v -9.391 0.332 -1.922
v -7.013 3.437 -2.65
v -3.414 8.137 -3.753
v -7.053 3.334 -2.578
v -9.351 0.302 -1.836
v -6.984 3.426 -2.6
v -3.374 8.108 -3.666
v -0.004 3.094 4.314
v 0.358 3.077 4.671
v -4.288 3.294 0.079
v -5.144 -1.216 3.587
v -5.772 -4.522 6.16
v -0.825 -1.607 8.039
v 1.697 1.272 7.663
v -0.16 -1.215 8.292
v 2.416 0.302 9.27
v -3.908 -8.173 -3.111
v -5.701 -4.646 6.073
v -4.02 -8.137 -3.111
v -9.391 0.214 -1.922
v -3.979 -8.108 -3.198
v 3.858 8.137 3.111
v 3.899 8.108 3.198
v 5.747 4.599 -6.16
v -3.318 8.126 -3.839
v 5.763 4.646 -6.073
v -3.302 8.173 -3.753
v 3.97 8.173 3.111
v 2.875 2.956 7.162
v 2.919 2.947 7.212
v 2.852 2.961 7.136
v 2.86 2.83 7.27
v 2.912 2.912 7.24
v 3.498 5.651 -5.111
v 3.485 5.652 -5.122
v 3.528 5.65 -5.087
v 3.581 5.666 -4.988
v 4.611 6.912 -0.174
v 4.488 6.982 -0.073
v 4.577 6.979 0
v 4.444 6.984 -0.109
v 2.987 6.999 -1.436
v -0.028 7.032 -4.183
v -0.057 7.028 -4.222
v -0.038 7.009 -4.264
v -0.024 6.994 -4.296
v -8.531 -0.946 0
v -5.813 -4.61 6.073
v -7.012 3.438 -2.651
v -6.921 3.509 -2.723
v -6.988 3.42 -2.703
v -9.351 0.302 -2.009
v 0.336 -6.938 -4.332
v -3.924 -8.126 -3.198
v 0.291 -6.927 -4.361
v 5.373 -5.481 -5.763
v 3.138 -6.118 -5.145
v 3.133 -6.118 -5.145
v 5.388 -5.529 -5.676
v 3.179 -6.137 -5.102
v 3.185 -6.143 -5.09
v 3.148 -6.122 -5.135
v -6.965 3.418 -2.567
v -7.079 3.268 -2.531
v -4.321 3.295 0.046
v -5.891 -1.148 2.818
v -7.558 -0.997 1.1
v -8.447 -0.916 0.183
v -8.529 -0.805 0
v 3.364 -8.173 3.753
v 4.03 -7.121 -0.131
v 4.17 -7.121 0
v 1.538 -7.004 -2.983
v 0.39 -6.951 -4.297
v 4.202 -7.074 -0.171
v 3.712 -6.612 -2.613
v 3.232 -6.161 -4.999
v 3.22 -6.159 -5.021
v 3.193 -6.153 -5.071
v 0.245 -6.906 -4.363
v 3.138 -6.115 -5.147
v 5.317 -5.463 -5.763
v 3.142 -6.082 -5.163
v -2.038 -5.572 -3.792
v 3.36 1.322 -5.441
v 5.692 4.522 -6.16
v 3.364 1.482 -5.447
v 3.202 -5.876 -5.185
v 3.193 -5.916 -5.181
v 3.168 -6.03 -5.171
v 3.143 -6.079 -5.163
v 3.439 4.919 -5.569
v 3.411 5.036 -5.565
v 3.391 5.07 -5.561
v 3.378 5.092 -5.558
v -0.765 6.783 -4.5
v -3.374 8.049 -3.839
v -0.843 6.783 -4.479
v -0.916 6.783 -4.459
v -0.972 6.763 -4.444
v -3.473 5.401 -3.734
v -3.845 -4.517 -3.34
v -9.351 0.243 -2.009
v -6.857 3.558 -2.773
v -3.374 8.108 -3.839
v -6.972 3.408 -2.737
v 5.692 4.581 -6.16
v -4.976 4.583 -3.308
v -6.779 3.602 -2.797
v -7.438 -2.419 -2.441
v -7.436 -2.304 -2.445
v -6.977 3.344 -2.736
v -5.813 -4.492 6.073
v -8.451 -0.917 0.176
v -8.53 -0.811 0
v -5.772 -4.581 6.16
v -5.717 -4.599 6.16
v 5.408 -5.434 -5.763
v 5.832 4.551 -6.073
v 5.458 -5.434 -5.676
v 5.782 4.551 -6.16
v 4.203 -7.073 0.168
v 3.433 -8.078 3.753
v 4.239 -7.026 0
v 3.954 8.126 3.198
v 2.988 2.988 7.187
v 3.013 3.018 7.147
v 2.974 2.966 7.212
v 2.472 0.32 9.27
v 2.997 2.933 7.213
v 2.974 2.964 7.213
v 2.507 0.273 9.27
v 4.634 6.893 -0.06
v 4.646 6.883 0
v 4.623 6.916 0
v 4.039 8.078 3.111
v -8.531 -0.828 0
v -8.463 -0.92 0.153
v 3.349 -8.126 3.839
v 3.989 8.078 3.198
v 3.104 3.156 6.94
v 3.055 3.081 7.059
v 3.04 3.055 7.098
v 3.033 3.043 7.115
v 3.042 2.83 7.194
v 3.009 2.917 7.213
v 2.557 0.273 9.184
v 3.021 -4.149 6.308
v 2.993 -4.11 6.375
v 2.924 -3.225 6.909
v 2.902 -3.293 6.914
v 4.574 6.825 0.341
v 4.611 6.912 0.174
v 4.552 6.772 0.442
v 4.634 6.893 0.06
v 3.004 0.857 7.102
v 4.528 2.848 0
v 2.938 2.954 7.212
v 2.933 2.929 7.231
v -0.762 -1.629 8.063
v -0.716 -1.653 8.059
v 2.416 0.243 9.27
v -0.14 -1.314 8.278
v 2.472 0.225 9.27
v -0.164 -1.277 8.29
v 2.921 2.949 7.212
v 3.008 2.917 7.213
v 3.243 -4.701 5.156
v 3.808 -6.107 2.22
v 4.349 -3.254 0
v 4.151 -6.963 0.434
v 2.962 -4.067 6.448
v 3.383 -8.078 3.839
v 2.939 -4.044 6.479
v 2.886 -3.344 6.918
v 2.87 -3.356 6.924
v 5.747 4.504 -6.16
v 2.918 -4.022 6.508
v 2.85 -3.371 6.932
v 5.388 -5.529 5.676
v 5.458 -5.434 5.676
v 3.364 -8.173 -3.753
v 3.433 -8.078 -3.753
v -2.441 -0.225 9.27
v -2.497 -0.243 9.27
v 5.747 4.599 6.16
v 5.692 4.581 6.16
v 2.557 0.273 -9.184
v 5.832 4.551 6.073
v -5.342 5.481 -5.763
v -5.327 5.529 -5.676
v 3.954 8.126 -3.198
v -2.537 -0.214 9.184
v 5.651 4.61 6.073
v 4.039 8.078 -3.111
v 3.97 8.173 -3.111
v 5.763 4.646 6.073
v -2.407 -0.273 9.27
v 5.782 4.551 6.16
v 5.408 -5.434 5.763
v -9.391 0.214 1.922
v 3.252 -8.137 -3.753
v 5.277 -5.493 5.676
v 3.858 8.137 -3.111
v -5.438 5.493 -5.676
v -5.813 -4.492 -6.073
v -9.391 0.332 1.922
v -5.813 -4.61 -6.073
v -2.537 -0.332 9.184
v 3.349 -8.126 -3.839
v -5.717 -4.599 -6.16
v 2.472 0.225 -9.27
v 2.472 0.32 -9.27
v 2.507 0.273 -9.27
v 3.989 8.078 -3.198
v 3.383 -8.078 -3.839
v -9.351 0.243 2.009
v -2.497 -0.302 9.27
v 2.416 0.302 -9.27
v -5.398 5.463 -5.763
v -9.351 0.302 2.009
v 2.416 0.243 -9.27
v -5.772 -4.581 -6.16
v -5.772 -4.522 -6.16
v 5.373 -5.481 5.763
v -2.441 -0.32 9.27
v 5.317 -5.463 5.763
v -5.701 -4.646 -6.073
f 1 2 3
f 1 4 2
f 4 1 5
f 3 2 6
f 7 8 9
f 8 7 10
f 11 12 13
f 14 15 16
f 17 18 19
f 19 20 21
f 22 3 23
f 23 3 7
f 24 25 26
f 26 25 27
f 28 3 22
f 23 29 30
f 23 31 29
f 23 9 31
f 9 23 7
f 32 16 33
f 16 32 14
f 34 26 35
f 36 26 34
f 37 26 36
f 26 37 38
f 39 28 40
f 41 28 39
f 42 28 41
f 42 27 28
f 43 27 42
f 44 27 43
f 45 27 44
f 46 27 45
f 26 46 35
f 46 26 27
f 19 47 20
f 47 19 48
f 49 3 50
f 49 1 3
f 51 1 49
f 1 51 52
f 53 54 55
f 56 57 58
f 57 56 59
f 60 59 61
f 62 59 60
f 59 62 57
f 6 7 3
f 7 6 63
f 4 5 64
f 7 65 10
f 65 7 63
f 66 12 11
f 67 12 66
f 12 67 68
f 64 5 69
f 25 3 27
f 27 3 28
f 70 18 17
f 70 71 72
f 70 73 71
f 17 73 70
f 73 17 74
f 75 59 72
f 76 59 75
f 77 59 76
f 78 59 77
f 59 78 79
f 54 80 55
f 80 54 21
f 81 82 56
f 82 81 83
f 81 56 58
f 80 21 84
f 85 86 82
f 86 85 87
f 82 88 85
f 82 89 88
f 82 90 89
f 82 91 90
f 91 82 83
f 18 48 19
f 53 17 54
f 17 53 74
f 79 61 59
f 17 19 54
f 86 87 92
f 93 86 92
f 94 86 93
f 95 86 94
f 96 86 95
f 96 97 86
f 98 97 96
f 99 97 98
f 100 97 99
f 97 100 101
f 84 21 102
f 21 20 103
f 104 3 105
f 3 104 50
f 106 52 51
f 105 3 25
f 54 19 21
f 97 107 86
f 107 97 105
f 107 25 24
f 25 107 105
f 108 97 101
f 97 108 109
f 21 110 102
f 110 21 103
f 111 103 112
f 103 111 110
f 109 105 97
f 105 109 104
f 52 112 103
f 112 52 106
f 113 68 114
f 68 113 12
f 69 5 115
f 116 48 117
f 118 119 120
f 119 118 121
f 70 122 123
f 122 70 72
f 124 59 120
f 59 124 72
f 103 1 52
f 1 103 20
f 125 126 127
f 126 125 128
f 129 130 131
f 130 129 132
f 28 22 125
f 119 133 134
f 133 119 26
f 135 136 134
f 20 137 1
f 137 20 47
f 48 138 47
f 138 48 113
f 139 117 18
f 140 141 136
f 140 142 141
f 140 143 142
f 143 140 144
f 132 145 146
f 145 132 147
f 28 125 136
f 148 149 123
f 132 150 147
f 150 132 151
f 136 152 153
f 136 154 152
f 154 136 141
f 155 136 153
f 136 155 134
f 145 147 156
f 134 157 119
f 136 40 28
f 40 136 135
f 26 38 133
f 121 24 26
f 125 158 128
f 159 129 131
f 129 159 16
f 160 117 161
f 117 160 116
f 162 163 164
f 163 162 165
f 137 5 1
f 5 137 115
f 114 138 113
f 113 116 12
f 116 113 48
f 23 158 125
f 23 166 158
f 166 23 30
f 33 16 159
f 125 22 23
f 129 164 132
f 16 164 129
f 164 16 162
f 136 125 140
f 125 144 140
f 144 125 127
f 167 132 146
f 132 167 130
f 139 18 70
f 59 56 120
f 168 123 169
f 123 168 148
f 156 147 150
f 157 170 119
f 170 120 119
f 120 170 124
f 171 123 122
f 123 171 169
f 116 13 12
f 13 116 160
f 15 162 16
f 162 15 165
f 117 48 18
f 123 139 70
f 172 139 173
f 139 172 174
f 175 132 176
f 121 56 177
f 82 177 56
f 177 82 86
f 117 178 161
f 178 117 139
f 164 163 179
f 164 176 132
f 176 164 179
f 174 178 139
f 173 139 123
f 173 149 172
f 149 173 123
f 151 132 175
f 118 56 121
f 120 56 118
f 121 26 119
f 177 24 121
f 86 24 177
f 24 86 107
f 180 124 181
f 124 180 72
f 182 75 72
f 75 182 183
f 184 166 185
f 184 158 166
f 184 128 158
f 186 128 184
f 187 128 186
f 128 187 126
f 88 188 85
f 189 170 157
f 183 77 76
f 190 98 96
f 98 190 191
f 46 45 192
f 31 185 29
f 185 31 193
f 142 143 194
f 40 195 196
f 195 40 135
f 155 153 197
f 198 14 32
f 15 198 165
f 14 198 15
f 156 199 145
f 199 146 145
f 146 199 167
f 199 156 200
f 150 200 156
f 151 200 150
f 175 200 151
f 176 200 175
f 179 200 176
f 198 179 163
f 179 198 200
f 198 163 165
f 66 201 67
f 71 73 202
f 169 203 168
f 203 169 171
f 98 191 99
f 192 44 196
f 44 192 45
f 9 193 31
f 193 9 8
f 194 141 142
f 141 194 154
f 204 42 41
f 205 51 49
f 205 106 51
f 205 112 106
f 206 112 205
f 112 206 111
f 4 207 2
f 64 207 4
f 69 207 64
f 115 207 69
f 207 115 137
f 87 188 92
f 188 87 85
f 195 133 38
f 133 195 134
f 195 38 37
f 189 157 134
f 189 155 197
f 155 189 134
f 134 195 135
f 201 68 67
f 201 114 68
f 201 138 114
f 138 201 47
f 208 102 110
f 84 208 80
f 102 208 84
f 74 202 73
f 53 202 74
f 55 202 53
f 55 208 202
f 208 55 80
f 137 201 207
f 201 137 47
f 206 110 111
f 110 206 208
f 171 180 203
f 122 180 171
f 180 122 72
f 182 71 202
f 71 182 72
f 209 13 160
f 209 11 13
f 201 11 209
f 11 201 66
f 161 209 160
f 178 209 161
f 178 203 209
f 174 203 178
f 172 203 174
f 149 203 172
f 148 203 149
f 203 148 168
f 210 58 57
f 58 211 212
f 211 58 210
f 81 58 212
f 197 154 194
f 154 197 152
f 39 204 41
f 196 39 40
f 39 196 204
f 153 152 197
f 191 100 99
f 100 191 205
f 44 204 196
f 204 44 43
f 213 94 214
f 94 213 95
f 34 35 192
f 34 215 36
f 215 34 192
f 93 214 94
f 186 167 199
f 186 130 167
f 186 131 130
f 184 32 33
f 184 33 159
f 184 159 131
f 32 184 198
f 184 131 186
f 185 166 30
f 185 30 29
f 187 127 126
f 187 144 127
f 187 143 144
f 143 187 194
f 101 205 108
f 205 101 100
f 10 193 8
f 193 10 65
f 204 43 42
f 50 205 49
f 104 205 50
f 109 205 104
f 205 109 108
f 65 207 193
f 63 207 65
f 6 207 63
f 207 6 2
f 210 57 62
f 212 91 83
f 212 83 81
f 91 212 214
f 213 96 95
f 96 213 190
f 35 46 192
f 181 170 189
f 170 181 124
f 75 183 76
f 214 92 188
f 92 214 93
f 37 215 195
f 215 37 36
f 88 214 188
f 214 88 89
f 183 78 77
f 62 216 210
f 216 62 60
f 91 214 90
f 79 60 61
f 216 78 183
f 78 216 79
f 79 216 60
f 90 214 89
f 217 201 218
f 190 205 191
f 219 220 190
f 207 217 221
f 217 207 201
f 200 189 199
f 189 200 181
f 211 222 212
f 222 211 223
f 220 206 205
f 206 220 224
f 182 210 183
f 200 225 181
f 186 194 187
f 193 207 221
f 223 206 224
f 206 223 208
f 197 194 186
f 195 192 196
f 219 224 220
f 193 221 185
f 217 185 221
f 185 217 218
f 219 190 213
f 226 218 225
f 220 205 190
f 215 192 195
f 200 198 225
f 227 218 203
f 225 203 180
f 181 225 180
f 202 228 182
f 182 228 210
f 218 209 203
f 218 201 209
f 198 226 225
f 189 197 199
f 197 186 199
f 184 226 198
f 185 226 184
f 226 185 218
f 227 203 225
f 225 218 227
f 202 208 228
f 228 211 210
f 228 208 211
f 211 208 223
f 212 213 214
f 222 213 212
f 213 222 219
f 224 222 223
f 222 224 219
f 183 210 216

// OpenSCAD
// Auto-generated OpenSCAD file

    inner_points = 10*[[0.5357591741651873, -0.543383530882565, 0.5676309916995522], [-0.5731986516605712, -0.45512777948624156, -0.6072977089606933], [0.5731986515218852, 0.45512777955762335, 0.6072977089606933], [-0.5357591743038732, 0.5433835309539468, -0.5676309916995522], [0.3333250709014692, -0.8078126191713554, -0.3752887774762634], [0.3939034177856385, 0.8078126192720669, -0.31110668072560493], [-0.2456533920977693, -0.027272527020831643, 0.9183785262299818], [-0.9310270205482738, 0.02727252704475715, 0.19223265486419908], [0.24565339195908334, 0.027272527092213467, -0.9183785262299818]];

    outer_points = 10*[[-0.3333250709381238, 0.8078126192179577, -0.37528877748181], [-0.39390341794565986, -0.8078126192179577, -0.31110668065861835], [0.39390341794565986, 0.8078126192179577, 0.31110668065861835], [0.3333250709381238, -0.8078126192179577, 0.37528877748181], [-0.9310270204929976, 0.027272527075261566, -0.19223265478667906], [0.24565339210818965, 0.027272527075261566, 0.9183785262080897], [0.5731986515762008, 0.45512777945089933, -0.6072977090281112], [0.5357591741432581, -0.5433835309846493, -0.5676309917221422], [-0.5731986515762008, -0.45512777945089933, 0.6072977090281112]];

    // Convex hull for inner set (I)
    module inner_hull() {
        hull() {
            for (p = inner_points) {
                translate(p) sphere(r=0.1);
            }
        }
    }

    // Convex hull for outer set (O) minus inner hull (O \ I)
    module outer_minus_inner() {
        difference() {
            hull() {
                for (p = outer_points) {
                    translate(p) sphere(r=0.1);
                }
            }
            inner_hull(); // Subtract inner hull
        }
    }

    // Convex hull for outer set (O) minus all translated inner hulls
    module outer_minus_AllTranslationInner() {
        difference() {
            hull() {
                for (p = outer_points) {
                    translate(p) sphere(r=0.1);
                }
            }
            hull() {
                translate([0,0,50]) inner_hull();
                translate([0,0,-50]) inner_hull();
            }; // Subtract translated inner hulls
        }
    }

    // Difference between outer_minus_inner and outer_minus_AllTranslationInner
    module outer_minus_inner_diff() {
        difference() {
            // Outer minus inner
            difference() {
                hull() {
                    for (p = outer_points) {
                        translate(p) sphere(r=0.1);
                    }
                }
                inner_hull();
            }

            // Subtract Outer minus AllTranslationInner
            difference() {
                hull() {
                    for (p = outer_points) {
                        translate(p) sphere(r=0.1);
                    }
                }
                hull() {
                    translate([0,0,50]) inner_hull();
                    translate([0,0,-50]) inner_hull();
                };
            }
        }
    }

    // Rendering all with colors applied
    color([1, 0, 0, 0.5]) inner_hull(); // Transparent red
    color([0, 1, 0, 1]) outer_minus_AllTranslationInner(); // Opaque green
    color([1, 1, 0, 1]) outer_minus_inner_diff(); // Opaque yellow
    
